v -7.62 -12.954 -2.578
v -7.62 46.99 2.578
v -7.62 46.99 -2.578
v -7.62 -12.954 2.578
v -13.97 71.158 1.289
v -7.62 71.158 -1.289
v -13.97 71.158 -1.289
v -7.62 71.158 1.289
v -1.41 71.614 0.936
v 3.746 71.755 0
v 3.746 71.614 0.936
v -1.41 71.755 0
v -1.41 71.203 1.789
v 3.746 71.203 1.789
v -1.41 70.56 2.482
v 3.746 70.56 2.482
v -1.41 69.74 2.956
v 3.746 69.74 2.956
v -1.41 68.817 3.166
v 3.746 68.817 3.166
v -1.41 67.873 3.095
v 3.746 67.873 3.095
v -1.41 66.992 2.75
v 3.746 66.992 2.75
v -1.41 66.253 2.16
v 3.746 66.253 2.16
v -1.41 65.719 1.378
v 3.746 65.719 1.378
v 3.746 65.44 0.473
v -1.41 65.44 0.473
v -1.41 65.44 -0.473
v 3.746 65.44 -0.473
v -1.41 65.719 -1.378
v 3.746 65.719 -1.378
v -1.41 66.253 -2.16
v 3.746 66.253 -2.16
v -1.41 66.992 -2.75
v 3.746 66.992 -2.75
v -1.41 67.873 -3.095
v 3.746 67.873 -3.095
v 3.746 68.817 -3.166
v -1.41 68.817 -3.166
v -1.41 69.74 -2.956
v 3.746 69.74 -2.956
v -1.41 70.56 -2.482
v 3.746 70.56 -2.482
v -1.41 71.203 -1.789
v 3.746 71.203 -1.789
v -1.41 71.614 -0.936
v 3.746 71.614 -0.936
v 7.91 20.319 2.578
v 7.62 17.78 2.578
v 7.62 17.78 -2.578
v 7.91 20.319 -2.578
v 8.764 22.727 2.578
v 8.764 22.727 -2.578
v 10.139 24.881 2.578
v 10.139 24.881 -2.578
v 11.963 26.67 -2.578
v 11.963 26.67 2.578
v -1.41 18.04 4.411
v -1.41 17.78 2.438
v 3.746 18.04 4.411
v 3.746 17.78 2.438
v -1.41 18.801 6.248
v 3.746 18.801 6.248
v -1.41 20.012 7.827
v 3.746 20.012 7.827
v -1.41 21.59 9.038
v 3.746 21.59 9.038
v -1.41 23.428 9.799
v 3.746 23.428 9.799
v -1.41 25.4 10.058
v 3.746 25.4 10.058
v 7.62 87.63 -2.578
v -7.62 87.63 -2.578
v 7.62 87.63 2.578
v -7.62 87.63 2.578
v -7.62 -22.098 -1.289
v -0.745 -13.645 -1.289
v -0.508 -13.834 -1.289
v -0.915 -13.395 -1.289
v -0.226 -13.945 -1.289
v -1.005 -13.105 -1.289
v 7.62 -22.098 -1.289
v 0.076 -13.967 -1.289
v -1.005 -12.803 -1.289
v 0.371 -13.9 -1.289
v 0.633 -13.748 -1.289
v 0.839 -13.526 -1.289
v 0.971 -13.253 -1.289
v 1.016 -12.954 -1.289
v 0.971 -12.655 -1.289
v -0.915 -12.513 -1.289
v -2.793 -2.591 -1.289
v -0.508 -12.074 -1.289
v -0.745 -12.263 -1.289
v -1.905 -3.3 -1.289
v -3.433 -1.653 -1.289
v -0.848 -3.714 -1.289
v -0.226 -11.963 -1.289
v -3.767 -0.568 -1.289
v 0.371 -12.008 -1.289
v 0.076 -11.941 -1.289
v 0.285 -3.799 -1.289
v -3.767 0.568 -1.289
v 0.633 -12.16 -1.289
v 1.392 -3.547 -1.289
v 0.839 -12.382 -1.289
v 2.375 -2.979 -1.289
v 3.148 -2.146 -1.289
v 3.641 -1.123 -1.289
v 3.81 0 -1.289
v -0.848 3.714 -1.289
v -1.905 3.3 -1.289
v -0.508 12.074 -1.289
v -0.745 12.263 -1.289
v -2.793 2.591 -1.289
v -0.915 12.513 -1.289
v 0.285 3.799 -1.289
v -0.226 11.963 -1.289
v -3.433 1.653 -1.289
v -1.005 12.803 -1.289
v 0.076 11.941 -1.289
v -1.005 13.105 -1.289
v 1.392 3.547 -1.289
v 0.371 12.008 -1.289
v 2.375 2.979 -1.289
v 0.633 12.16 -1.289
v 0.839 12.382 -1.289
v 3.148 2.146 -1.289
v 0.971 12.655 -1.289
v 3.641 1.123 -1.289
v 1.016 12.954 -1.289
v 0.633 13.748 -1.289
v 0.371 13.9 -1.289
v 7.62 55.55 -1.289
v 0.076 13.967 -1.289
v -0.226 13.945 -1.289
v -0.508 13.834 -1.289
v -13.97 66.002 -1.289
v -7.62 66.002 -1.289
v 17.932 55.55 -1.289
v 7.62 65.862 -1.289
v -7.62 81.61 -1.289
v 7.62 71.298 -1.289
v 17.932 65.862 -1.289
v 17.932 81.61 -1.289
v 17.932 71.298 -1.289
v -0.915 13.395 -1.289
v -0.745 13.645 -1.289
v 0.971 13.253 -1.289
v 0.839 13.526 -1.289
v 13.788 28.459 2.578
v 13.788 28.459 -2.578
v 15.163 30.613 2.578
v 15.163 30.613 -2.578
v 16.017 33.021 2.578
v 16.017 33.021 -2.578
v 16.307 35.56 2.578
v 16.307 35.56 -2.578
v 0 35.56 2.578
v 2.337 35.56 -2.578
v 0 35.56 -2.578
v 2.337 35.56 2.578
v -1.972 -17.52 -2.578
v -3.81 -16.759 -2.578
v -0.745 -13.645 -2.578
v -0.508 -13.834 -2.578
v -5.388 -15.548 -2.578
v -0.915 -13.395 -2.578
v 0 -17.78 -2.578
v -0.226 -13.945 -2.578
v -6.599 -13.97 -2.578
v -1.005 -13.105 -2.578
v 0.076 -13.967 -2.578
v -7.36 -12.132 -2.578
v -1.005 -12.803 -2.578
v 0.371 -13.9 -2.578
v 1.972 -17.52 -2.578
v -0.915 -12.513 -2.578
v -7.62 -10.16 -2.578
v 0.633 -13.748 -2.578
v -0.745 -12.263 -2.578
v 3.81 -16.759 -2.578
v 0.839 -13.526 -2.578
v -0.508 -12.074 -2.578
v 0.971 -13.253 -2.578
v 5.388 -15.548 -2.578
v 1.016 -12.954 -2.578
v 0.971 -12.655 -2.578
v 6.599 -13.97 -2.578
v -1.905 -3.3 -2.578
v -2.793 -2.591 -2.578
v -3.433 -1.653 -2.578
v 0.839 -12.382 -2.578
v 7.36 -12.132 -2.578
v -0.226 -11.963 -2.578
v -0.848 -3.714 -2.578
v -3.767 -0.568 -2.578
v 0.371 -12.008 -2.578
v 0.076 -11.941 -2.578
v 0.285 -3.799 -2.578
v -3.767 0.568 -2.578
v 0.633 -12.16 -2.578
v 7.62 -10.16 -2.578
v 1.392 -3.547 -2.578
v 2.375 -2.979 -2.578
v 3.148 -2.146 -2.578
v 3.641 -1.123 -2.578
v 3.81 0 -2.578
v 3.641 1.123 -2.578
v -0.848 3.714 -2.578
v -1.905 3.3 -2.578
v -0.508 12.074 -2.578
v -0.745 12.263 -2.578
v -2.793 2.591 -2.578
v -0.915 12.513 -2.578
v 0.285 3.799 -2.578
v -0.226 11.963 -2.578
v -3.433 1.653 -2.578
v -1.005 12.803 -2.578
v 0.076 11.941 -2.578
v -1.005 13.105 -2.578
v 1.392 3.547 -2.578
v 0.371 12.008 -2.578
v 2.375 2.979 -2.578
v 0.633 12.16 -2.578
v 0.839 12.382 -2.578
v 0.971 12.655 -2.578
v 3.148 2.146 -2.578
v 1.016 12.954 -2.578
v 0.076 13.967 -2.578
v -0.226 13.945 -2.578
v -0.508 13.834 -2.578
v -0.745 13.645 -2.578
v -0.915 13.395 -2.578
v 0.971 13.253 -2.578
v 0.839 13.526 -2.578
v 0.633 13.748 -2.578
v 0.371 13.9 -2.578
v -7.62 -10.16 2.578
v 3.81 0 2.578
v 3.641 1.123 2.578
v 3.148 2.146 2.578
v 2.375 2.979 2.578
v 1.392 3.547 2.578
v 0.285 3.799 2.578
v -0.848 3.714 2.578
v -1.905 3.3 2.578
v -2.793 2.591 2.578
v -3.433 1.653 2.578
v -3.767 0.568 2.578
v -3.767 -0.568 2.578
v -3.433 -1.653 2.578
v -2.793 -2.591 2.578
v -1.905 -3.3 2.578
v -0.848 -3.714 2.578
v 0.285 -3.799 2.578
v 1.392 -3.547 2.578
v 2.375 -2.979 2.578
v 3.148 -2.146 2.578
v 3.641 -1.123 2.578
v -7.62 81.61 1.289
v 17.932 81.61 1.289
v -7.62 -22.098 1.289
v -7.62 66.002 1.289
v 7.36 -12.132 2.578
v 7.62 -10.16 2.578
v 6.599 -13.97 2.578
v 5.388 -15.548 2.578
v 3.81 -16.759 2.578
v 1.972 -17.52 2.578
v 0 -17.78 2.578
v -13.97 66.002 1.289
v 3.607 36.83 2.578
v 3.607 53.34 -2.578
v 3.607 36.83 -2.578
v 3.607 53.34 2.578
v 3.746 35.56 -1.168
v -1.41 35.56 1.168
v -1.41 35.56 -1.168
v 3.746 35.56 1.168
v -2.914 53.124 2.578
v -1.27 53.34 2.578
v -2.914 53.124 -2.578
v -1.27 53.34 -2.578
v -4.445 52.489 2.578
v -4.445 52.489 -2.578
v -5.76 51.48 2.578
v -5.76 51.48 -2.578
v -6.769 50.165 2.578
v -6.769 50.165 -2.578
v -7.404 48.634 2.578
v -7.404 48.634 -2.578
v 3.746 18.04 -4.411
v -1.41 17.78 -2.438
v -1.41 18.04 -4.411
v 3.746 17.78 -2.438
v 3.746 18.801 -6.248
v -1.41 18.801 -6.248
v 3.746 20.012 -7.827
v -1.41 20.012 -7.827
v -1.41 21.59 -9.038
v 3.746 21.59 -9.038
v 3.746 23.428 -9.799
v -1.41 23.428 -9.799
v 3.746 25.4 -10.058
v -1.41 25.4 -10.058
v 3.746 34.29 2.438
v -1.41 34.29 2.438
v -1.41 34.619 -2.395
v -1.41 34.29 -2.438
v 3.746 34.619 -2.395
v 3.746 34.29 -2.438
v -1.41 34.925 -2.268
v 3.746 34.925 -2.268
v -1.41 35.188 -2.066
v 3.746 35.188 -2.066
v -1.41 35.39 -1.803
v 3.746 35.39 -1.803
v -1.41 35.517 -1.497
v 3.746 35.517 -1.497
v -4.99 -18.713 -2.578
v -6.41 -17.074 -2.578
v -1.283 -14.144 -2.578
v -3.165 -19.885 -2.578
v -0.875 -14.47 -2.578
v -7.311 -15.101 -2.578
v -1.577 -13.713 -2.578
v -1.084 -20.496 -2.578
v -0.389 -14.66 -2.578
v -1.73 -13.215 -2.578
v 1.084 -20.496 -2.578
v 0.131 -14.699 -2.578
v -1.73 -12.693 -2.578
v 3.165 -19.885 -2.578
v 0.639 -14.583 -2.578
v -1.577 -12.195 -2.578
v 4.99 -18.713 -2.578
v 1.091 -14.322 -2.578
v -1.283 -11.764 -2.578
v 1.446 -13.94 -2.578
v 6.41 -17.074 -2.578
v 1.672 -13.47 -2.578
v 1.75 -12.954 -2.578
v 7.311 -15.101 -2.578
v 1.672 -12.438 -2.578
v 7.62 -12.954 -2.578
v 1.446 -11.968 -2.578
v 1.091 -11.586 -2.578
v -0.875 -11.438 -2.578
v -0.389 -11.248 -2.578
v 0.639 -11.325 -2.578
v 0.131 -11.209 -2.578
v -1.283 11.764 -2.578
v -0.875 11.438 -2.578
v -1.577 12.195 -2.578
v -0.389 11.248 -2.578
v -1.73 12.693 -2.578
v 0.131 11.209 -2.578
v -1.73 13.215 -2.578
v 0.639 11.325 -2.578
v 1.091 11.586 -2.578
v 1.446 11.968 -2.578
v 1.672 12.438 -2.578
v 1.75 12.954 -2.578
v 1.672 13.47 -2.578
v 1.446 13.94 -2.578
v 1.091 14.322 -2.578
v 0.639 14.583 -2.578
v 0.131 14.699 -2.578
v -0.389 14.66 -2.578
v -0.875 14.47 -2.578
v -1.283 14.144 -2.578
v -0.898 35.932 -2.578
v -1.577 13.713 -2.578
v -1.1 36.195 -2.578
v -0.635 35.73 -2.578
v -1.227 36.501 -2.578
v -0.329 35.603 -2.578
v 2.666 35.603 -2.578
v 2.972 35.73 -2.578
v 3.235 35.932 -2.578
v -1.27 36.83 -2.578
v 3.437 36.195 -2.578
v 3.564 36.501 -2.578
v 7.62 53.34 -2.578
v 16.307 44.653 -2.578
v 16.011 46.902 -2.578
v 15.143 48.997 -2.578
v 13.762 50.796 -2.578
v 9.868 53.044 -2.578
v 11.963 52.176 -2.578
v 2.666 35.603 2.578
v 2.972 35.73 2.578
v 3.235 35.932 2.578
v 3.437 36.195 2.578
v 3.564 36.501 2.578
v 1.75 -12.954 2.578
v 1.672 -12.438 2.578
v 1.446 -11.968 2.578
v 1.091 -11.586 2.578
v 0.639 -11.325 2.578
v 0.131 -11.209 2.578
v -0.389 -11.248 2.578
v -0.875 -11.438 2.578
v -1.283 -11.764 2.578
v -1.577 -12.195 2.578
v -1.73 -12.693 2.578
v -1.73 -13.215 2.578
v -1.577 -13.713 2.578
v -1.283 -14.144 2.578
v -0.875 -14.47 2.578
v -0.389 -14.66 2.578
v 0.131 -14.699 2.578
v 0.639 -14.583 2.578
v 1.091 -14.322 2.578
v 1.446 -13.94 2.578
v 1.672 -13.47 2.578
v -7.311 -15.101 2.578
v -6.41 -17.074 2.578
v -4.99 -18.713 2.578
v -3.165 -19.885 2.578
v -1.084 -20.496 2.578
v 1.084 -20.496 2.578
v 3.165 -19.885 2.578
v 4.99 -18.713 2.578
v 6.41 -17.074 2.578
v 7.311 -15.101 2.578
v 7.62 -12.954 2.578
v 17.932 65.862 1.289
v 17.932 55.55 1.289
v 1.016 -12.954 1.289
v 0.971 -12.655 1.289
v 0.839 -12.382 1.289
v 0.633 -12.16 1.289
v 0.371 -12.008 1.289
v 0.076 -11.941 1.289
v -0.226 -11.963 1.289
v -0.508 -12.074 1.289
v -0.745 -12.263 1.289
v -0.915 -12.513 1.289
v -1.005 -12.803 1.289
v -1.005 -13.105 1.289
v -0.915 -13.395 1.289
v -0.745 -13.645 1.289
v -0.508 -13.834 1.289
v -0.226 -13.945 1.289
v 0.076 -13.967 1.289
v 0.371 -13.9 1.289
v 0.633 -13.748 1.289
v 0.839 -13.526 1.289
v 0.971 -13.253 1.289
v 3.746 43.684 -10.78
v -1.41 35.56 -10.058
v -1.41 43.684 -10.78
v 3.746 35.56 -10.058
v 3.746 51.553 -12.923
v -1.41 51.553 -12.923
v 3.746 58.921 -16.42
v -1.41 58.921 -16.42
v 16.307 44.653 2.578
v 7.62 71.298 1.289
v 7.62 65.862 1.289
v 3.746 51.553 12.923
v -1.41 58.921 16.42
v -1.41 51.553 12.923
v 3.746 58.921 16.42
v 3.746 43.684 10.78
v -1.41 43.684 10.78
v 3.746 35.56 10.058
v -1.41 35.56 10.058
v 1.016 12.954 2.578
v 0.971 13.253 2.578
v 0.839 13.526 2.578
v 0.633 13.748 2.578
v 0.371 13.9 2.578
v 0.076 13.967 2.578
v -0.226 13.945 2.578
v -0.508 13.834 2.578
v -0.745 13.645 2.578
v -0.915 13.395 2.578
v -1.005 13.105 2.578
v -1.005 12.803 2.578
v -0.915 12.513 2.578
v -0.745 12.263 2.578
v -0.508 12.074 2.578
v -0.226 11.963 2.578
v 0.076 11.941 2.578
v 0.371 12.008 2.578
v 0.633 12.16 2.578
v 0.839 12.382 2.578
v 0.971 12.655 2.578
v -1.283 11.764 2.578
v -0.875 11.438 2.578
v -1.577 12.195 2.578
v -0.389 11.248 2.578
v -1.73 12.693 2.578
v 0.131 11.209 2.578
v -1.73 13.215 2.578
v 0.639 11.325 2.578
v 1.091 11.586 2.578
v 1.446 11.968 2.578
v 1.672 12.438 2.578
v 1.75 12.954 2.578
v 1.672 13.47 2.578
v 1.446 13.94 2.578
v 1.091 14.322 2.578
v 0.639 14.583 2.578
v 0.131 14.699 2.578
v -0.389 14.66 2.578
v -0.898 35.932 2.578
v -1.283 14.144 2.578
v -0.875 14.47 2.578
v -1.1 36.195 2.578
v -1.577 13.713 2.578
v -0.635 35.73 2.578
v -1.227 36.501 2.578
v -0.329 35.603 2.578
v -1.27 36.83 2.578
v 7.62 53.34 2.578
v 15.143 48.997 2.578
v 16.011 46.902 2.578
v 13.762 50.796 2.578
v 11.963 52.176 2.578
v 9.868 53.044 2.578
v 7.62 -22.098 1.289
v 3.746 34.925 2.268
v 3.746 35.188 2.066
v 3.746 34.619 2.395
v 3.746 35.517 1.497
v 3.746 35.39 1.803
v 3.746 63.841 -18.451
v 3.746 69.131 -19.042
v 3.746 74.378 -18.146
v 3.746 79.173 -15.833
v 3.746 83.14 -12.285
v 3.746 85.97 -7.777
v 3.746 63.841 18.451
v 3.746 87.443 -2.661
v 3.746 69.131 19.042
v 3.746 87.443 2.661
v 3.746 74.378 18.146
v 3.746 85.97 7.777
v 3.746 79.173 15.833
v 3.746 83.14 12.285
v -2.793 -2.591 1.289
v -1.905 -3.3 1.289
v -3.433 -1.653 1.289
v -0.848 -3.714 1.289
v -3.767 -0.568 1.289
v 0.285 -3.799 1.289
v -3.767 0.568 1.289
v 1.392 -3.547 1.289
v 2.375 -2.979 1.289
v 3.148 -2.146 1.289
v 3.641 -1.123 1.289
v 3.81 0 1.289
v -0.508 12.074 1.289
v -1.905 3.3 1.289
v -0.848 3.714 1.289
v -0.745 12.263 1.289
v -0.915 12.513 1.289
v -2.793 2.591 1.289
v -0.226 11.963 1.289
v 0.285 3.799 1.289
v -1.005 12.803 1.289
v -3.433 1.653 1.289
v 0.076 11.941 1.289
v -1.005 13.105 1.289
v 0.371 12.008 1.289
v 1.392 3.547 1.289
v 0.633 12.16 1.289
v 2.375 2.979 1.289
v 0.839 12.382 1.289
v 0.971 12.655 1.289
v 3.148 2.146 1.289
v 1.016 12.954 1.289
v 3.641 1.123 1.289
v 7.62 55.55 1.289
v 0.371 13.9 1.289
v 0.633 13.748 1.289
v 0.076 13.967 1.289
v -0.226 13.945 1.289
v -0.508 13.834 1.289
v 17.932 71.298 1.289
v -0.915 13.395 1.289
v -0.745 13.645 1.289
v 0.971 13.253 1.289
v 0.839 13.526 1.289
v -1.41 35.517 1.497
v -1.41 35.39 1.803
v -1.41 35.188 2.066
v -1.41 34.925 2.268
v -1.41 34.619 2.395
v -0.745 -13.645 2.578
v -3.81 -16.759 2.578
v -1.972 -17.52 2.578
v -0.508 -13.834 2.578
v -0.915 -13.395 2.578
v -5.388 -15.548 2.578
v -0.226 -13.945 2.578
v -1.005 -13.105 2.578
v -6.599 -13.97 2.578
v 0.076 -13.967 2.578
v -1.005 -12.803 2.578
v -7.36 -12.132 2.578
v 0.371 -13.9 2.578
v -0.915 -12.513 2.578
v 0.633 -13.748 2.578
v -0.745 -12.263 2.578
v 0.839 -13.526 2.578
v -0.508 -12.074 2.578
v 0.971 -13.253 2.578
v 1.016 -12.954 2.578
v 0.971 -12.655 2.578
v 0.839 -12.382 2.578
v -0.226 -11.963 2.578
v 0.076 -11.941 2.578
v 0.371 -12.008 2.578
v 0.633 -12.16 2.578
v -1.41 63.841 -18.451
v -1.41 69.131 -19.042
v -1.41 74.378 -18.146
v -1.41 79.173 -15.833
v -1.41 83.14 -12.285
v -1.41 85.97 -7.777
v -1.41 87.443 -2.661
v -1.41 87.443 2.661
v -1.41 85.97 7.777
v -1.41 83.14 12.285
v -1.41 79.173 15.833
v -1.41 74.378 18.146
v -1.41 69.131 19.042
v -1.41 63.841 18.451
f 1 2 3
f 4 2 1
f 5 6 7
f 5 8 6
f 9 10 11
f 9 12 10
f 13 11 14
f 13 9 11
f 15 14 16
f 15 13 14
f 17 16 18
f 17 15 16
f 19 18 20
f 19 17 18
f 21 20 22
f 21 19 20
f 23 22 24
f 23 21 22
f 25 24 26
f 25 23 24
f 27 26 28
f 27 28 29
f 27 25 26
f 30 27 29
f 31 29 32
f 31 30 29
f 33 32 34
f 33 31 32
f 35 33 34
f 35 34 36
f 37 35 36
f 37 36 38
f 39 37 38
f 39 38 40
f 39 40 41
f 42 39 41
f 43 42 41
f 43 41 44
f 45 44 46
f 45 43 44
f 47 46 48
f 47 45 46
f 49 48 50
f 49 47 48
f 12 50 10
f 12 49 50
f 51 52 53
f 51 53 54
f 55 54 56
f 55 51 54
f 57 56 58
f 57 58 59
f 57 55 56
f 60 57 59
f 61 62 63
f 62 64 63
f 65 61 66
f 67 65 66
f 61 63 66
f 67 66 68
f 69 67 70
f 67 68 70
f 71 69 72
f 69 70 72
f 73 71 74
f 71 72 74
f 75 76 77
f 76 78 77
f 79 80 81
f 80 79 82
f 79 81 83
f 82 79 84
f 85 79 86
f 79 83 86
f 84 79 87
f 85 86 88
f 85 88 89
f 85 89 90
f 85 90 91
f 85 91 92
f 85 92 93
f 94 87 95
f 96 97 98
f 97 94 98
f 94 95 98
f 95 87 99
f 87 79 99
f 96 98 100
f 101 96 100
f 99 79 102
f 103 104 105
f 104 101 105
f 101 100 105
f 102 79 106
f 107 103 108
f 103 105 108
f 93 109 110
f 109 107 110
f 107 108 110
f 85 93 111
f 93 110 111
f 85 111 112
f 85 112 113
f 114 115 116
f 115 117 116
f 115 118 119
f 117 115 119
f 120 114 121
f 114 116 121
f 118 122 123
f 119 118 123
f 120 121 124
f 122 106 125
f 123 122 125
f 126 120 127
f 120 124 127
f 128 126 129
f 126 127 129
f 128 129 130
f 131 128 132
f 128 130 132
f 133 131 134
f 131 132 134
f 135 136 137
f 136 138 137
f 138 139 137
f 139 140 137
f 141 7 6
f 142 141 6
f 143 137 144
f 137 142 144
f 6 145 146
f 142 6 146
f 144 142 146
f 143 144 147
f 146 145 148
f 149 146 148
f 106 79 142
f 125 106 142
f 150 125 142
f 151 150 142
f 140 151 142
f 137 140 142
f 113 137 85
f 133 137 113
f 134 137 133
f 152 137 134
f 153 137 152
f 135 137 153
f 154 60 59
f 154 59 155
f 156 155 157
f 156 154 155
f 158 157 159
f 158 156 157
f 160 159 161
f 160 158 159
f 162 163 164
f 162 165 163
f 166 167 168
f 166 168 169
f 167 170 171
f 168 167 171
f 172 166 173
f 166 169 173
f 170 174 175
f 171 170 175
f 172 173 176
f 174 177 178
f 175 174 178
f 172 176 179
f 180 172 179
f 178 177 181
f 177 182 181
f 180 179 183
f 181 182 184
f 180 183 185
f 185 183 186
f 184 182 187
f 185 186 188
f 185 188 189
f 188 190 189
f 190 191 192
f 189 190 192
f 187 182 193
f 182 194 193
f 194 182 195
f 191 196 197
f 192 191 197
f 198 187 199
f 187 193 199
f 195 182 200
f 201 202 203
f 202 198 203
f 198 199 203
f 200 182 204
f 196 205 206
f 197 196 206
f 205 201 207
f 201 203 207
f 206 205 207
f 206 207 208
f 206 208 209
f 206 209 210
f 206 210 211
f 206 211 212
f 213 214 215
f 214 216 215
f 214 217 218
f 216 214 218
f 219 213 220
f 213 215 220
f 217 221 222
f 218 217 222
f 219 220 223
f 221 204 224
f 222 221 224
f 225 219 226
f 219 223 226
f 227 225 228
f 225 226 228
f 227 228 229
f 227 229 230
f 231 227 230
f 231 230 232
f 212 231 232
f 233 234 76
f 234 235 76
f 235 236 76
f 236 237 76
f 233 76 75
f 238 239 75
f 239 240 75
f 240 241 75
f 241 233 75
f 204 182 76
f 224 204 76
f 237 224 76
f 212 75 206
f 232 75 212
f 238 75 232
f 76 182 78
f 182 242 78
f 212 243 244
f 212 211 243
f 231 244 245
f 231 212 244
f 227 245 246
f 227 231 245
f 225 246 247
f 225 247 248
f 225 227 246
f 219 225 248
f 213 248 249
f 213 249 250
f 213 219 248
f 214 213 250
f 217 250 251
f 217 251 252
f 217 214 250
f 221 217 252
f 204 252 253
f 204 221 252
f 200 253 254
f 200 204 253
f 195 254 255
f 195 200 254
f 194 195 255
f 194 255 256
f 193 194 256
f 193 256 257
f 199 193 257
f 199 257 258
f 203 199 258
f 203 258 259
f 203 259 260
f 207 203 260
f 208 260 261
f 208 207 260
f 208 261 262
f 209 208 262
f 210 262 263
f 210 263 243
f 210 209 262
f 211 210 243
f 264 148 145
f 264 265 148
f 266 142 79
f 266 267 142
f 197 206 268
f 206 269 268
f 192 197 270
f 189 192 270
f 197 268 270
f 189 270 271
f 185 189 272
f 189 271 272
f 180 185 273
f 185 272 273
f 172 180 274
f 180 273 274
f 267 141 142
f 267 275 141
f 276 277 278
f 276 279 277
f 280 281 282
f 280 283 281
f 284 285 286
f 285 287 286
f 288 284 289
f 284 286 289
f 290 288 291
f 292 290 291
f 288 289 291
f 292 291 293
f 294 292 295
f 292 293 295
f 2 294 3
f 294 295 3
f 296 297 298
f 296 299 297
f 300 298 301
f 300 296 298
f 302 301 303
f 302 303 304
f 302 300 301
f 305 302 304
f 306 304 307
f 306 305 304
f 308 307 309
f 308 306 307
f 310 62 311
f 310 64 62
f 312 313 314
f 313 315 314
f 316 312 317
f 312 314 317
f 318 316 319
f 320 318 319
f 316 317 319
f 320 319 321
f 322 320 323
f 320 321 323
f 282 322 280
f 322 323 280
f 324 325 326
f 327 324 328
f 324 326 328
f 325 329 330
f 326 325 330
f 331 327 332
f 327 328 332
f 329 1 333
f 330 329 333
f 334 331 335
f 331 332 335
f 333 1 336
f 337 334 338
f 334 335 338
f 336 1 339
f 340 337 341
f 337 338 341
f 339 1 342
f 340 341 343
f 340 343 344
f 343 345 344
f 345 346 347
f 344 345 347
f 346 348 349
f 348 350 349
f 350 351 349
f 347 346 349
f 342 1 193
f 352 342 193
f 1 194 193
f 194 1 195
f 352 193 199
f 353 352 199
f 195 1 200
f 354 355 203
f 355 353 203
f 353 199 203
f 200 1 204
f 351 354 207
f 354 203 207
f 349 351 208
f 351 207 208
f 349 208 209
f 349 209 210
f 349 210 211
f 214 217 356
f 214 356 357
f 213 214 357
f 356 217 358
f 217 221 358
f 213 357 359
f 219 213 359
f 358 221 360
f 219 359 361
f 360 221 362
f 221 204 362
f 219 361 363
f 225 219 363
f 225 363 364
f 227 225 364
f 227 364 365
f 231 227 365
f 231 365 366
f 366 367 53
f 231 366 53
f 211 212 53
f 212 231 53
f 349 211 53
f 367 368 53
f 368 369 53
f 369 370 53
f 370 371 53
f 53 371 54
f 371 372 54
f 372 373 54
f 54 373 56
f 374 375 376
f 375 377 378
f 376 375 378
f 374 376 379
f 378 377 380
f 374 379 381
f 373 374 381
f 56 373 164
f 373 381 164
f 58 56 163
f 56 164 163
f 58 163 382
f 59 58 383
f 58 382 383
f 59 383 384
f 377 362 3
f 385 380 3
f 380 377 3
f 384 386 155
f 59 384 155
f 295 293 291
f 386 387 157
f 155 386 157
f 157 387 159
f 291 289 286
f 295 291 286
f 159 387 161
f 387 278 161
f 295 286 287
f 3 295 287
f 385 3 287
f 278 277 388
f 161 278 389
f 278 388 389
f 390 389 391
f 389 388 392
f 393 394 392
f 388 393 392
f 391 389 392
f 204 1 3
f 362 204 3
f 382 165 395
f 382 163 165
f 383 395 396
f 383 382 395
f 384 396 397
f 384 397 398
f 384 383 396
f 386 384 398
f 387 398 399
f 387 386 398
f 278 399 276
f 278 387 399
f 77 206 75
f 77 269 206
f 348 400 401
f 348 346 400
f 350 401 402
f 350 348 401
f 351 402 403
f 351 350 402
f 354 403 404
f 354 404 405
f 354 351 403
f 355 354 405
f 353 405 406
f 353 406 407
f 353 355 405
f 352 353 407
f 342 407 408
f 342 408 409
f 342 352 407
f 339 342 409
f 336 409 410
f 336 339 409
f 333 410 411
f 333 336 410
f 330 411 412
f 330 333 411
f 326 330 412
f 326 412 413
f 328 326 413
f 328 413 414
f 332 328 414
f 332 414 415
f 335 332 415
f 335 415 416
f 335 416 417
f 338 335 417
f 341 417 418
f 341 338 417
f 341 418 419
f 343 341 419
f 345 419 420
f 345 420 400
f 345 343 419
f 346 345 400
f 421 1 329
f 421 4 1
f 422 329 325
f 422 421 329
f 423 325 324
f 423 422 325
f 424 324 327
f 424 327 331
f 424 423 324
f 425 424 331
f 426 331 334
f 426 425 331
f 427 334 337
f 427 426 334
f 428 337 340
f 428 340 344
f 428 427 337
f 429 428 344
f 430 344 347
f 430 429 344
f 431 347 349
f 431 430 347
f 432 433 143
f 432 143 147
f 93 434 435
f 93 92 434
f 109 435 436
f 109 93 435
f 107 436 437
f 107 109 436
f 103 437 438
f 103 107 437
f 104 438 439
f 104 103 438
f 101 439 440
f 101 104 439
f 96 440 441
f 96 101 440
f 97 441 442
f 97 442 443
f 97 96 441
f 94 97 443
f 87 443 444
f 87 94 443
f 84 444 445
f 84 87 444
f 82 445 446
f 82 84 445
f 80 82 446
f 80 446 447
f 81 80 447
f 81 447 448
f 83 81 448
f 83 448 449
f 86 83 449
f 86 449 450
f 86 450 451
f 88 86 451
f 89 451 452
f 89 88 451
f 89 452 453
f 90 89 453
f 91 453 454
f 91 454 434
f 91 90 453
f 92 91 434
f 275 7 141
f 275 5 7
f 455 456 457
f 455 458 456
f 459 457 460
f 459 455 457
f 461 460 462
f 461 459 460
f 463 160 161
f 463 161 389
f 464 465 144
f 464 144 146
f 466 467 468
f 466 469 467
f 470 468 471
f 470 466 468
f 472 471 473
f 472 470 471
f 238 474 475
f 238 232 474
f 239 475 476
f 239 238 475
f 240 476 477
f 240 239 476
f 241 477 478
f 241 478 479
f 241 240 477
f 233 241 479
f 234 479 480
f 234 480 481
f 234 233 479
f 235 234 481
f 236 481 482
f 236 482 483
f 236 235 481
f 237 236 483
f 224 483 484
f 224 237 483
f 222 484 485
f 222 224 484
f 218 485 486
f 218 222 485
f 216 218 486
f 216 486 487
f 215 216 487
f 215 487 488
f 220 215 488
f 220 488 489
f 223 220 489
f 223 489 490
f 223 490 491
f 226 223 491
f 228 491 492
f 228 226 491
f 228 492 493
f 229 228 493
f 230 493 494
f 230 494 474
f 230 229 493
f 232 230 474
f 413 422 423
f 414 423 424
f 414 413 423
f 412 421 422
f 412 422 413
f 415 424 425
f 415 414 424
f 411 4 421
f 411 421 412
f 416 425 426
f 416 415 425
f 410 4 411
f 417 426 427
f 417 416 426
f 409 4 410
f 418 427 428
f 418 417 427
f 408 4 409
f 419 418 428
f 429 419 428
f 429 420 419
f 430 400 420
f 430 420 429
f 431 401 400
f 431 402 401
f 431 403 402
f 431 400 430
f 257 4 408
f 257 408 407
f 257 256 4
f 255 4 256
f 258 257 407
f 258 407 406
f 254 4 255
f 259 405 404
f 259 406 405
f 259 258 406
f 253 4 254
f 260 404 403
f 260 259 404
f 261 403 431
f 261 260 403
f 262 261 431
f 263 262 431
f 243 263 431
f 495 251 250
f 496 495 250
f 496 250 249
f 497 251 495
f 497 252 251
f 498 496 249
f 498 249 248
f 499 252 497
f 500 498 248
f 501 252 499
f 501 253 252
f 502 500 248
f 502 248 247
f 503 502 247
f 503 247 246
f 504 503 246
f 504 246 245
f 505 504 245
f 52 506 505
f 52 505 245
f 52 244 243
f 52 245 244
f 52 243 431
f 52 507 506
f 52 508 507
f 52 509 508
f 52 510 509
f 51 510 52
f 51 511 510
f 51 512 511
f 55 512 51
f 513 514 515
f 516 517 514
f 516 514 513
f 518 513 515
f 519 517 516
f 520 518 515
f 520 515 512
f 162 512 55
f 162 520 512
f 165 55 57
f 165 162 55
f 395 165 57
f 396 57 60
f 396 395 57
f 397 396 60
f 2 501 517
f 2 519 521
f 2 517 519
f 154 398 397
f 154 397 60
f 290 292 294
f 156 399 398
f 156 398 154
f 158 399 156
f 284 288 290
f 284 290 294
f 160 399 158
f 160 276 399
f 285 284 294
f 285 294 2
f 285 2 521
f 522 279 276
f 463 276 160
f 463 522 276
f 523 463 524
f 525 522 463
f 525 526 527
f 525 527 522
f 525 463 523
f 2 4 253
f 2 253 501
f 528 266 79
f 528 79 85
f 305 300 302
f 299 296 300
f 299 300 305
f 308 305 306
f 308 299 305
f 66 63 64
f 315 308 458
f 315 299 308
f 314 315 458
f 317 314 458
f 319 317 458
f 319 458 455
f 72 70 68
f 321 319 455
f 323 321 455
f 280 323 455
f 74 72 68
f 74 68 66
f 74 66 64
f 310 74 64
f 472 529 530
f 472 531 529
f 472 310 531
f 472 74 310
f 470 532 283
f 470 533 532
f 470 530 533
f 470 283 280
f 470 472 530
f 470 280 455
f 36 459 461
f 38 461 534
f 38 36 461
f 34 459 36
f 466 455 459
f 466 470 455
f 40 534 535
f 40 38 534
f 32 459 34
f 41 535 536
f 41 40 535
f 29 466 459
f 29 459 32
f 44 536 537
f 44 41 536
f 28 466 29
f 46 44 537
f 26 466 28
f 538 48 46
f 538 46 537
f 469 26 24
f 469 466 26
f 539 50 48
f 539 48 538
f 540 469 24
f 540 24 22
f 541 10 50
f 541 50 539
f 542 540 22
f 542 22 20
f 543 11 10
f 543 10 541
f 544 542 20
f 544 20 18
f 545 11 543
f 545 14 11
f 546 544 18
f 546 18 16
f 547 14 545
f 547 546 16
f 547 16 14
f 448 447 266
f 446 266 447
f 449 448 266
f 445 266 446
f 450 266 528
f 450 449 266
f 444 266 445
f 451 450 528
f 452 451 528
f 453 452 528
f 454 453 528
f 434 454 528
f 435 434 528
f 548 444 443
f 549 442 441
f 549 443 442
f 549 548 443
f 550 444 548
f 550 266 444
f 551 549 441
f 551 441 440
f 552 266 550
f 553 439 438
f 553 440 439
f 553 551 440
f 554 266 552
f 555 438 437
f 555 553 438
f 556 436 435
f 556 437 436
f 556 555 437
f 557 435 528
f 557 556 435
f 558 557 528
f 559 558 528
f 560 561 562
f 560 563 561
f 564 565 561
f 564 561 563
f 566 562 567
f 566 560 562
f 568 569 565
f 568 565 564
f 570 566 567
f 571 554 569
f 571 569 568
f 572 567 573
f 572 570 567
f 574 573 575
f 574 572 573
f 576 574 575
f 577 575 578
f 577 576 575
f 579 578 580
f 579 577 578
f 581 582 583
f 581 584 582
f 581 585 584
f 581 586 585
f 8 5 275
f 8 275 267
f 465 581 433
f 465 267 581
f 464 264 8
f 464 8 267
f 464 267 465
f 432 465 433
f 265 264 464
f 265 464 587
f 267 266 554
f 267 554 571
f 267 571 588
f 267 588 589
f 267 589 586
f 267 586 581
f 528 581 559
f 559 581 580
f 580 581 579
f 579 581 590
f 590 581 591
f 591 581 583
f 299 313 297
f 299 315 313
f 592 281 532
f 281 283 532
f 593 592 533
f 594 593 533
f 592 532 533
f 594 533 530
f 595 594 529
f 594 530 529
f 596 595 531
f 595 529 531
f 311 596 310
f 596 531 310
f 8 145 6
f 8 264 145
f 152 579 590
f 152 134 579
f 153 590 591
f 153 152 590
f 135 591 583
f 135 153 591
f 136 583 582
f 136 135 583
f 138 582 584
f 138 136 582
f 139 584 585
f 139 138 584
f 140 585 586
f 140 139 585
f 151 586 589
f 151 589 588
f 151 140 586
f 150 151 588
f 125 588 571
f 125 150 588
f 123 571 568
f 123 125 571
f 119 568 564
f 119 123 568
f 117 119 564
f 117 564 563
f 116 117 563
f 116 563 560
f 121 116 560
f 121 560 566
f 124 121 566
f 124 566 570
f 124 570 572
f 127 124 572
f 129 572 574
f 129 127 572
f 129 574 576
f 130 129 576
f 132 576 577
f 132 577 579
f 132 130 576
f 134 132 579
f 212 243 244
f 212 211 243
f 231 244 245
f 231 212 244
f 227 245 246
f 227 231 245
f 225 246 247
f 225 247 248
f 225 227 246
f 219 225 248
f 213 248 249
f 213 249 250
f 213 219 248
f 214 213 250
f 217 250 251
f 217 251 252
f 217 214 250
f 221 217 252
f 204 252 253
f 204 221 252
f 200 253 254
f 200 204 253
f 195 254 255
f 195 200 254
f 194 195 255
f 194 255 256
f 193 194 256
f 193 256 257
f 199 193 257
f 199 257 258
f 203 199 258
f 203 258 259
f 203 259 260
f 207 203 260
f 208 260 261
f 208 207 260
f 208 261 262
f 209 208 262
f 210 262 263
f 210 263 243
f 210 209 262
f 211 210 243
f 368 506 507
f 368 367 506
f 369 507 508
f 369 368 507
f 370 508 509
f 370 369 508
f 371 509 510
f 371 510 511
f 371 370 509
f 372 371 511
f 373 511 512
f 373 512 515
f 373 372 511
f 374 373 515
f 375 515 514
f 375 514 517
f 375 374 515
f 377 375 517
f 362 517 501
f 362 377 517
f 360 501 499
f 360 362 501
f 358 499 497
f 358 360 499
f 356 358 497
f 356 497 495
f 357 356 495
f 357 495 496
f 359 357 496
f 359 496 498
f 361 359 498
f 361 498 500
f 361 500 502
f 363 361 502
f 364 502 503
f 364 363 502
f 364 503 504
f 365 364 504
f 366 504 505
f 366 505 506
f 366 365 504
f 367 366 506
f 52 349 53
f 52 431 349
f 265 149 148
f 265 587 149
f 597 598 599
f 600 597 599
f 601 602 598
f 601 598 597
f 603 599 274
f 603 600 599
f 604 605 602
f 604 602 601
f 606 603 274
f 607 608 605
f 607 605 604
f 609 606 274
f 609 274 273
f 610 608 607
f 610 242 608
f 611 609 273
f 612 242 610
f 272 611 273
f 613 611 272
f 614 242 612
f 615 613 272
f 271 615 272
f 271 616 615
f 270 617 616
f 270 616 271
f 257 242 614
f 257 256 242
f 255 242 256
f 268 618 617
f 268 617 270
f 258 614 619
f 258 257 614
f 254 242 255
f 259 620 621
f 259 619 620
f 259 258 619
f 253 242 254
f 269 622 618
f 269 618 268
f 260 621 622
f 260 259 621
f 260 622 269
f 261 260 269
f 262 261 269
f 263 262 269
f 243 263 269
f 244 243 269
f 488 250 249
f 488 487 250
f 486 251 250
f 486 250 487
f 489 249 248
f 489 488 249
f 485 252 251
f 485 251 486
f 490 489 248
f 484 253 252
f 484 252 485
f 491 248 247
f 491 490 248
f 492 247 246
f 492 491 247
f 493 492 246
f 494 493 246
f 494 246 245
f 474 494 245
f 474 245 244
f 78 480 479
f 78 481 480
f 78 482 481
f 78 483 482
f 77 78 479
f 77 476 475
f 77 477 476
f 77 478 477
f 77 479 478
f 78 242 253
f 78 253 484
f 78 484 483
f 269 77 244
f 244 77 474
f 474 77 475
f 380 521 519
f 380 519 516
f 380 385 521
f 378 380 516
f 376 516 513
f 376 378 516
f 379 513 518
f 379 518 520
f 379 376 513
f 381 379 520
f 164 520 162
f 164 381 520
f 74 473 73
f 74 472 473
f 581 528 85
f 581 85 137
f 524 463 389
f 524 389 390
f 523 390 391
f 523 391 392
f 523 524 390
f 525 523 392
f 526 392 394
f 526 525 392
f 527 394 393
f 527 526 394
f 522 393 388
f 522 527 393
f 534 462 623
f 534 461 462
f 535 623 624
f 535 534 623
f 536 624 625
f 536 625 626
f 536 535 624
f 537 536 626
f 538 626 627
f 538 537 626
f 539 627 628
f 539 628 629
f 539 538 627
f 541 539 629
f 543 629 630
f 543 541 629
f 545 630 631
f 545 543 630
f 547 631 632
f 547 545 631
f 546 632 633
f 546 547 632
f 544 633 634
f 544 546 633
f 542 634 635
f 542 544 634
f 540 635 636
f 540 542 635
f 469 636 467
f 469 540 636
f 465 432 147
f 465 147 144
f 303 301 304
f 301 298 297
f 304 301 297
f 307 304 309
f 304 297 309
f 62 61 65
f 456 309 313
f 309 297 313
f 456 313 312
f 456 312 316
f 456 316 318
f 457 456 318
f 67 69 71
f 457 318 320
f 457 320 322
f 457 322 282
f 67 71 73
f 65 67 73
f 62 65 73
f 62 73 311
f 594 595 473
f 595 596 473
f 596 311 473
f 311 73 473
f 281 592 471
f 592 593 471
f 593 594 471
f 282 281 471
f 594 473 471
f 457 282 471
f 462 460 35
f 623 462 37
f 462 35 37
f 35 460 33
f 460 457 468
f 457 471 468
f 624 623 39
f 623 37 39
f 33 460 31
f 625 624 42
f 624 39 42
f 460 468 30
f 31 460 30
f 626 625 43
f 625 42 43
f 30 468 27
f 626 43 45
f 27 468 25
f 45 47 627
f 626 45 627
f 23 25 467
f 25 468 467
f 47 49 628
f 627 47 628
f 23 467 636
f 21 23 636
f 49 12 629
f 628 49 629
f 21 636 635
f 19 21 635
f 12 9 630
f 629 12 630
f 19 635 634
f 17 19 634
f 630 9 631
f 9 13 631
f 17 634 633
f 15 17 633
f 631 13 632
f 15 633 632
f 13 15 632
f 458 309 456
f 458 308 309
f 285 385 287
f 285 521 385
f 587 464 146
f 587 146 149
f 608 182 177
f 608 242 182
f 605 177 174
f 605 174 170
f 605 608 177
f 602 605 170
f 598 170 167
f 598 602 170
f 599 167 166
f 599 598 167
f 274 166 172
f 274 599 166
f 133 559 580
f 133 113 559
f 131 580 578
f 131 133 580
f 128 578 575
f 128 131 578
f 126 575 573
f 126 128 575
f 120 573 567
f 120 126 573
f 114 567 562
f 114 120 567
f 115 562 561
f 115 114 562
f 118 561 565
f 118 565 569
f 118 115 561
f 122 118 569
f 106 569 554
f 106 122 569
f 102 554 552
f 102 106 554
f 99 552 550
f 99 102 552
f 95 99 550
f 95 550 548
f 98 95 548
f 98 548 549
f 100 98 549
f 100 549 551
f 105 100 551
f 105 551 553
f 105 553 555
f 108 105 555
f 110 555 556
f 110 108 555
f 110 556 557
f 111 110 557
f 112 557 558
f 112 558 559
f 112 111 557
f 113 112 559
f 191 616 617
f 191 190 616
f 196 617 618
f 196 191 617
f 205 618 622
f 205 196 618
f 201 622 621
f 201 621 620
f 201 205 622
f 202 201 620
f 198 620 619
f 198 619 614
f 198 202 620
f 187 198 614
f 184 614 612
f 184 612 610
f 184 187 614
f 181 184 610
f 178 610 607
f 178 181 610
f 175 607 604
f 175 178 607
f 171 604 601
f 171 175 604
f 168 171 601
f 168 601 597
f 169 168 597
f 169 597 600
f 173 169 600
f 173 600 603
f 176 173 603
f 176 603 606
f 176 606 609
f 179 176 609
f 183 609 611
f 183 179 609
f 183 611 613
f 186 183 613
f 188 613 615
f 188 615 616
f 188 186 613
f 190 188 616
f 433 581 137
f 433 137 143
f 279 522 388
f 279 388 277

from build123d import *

# Parameters (mm, degrees)
F1_R      = 1.016
F1_R_2    = 3.81
F2_DEPTH  = 1.28905
F3_R      = 1.75
F3_R_2    = 3.81
F4_DEPTH  = 2.5781
F5_R      = 1.27
F6_R      = 6.34999
F9_R      = 3.175
F10_DEPTH = 2.5781
F11_R     = 1.27
F12_R     = 7.61999
F13_W     = 15.24
F13_H     = 105.41
F13_R     = 1.016
F13_R_2   = 3.81
F14_DEPTH = 2.5781
F15_R     = 7.61999


# Not quite as in the source:
# - a variable given as a bare number and used for a length is read in inches; the dataset says mm whatever the document's units were
# - a fillet or chamfer is up to 0.001 mm smaller than in the source, because OpenCascade refuses the exact size


with BuildPart() as f2:
    # F1 (on Top) → F2 (new body, symmetric)
    with BuildSketch(Plane.XY):
        Polygon((-7.62, 66.0019), (-7.62, -22.098), (7.62, -22.098), (7.62, 55.5498), (17.9324, 55.5498), (17.9324, 65.8622), (7.62, 65.8622), (7.62, 71.2978), (17.9324, 71.2978), (17.9324, 81.6102), (7.62, 81.6102), (-7.62, 81.6102), (-7.62, 71.1581), (-13.97, 71.1581), (-13.97, 66.0019), align=None)
        with Locations((0, -12.954)):
            Circle(F1_R, mode=Mode.SUBTRACT)
        Circle(F1_R_2, mode=Mode.SUBTRACT)
        with Locations((0, 12.954)):
            Circle(F1_R, mode=Mode.SUBTRACT)
    extrude(amount=F2_DEPTH, both=True)


with BuildPart() as f4:
    # F3 (on Top) → F4 (new body, symmetric)
    with BuildSketch(Plane.XY):
        with BuildLine():
            Line((7.62, -12.954), (7.62, 17.78))
            ThreePointArc((7.62, 17.78), (8.7639049612, 22.7271512904), (11.9634, 26.67))
            ThreePointArc((11.9634, 26.67), (15.1628950388, 30.6128487096), (16.3068, 35.56))
            Line((16.3068, 35.56), (16.3068, 44.6532))
            ThreePointArc((16.3068, 44.6532), (13.7624951868, 50.7956951868), (7.62, 53.34))
            Line((7.62, 53.34), (3.6068, 53.34))
            Line((3.6068, 53.34), (3.6068, 35.56))
            Line((3.6068, 35.56), (-1.27, 35.56))
            Line((-1.27, 35.56), (-1.27, 53.34))
            Line((-1.27, 53.34), (-7.62, 53.34))
            Line((-7.62, 53.34), (-7.62, -12.954))
            ThreePointArc((-7.62, -12.954), (0, -20.574), (7.62, -12.954))
        make_face()
        with Locations((0, -12.954)):
            Circle(F3_R, mode=Mode.SUBTRACT)
        Circle(F3_R_2, mode=Mode.SUBTRACT)
        with Locations((0, 12.954)):
            Circle(F3_R, mode=Mode.SUBTRACT)
    extrude(amount=F4_DEPTH, both=True)

    # F5
    f5_edges = [f4.edges().sort_by_distance(p)[0] for p in [
        (3.6068, 35.56, 0),
        (-1.27, 35.56, 0),
    ]]
    fillet(f5_edges, radius=F5_R)

    # F6 (radius 6.35 in the source; OpenCascade refuses exactly that, so slightly less here)
    f6_edges = [f4.edges().sort_by_distance(p)[0] for p in [
        (-7.62, 53.34, 0),
    ]]
    fillet(f6_edges, radius=F6_R)


with BuildPart() as f10:
    # F9 (on plane+point) → F10 (new body, symmetric)
    with BuildSketch(Plane.YZ.offset(1.1684)):
        with BuildLine():
            ThreePointArc((58.9212849333, -16.4198575895), (78.0379061631, -16.5363391054), (87.63, 0))
            ThreePointArc((87.63, 0), (78.0379061631, 16.5363391054), (58.9212849333, 16.4198575895))
            ThreePointArc((58.9212849333, 16.4198575895), (49.53, 0), (58.9212849333, -16.4198575895))
        make_face()
        with Locations((68.58, 0)):
            Circle(F9_R, mode=Mode.SUBTRACT)
        with BuildLine():
            ThreePointArc((58.9212849333, -16.4198575895), (49.53, 0), (58.9212849333, 16.4198575895))
            ThreePointArc((58.9212849333, 16.4198575895), (47.665967293, 11.6772014663), (35.56, 10.0584))
            Line((35.56, 10.0584), (17.78, 10.0584))
            Line((17.78, 10.0584), (17.78, 2.4384))
            Line((17.78, 2.4384), (35.56, 2.4384))
            Line((35.56, 2.4384), (35.56, 0))
            Line((35.56, 0), (35.56, -2.4384))
            Line((35.56, -2.4384), (17.78, -2.4384))
            Line((17.78, -2.4384), (17.78, -10.0584))
            Line((17.78, -10.0584), (35.56, -10.0584))
            ThreePointArc((35.56, -10.0584), (47.665967293, -11.6772014663), (58.9212849333, -16.4198575895))
        make_face()
    extrude(amount=F10_DEPTH, both=True)

    # F11
    f11_edges = [f10.edges().sort_by_distance(p)[0] for p in [
        (1.1684, 35.56, 2.4384),
        (1.1684, 35.56, -2.4384),
    ]]
    fillet(f11_edges, radius=F11_R)

    # F12 (radius 7.62 in the source; OpenCascade refuses exactly that, so slightly less here)
    f12_edges = [f10.edges().sort_by_distance(p)[0] for p in [
        (1.1684, 17.78, -10.0584),
        (1.1684, 17.78, 10.0584),
    ]]
    fillet(f12_edges, radius=F12_R)


with BuildPart() as f14:
    # F13 (on Top) → F14 (new body, symmetric)
    with BuildSketch(Plane.XY):
        with Locations((0, 34.925)):
            Rectangle(F13_W, F13_H)
        with Locations((0, -12.954)):
            Circle(F13_R, mode=Mode.SUBTRACT)
        Circle(F13_R_2, mode=Mode.SUBTRACT)
        with Locations((0, 12.954)):
            Circle(F13_R, mode=Mode.SUBTRACT)
    extrude(amount=F14_DEPTH, both=True)

    # F15 (radius 7.62 in the source; OpenCascade refuses exactly that, so slightly less here)
    f15_edges = [f14.edges().sort_by_distance(p)[0] for p in [
        (7.62, -17.78, 0),
        (-7.62, -17.78, 0),
    ]]
    fillet(f15_edges, radius=F15_R)


solid = Compound([f2.part, f4.part, f10.part, f14.part])
